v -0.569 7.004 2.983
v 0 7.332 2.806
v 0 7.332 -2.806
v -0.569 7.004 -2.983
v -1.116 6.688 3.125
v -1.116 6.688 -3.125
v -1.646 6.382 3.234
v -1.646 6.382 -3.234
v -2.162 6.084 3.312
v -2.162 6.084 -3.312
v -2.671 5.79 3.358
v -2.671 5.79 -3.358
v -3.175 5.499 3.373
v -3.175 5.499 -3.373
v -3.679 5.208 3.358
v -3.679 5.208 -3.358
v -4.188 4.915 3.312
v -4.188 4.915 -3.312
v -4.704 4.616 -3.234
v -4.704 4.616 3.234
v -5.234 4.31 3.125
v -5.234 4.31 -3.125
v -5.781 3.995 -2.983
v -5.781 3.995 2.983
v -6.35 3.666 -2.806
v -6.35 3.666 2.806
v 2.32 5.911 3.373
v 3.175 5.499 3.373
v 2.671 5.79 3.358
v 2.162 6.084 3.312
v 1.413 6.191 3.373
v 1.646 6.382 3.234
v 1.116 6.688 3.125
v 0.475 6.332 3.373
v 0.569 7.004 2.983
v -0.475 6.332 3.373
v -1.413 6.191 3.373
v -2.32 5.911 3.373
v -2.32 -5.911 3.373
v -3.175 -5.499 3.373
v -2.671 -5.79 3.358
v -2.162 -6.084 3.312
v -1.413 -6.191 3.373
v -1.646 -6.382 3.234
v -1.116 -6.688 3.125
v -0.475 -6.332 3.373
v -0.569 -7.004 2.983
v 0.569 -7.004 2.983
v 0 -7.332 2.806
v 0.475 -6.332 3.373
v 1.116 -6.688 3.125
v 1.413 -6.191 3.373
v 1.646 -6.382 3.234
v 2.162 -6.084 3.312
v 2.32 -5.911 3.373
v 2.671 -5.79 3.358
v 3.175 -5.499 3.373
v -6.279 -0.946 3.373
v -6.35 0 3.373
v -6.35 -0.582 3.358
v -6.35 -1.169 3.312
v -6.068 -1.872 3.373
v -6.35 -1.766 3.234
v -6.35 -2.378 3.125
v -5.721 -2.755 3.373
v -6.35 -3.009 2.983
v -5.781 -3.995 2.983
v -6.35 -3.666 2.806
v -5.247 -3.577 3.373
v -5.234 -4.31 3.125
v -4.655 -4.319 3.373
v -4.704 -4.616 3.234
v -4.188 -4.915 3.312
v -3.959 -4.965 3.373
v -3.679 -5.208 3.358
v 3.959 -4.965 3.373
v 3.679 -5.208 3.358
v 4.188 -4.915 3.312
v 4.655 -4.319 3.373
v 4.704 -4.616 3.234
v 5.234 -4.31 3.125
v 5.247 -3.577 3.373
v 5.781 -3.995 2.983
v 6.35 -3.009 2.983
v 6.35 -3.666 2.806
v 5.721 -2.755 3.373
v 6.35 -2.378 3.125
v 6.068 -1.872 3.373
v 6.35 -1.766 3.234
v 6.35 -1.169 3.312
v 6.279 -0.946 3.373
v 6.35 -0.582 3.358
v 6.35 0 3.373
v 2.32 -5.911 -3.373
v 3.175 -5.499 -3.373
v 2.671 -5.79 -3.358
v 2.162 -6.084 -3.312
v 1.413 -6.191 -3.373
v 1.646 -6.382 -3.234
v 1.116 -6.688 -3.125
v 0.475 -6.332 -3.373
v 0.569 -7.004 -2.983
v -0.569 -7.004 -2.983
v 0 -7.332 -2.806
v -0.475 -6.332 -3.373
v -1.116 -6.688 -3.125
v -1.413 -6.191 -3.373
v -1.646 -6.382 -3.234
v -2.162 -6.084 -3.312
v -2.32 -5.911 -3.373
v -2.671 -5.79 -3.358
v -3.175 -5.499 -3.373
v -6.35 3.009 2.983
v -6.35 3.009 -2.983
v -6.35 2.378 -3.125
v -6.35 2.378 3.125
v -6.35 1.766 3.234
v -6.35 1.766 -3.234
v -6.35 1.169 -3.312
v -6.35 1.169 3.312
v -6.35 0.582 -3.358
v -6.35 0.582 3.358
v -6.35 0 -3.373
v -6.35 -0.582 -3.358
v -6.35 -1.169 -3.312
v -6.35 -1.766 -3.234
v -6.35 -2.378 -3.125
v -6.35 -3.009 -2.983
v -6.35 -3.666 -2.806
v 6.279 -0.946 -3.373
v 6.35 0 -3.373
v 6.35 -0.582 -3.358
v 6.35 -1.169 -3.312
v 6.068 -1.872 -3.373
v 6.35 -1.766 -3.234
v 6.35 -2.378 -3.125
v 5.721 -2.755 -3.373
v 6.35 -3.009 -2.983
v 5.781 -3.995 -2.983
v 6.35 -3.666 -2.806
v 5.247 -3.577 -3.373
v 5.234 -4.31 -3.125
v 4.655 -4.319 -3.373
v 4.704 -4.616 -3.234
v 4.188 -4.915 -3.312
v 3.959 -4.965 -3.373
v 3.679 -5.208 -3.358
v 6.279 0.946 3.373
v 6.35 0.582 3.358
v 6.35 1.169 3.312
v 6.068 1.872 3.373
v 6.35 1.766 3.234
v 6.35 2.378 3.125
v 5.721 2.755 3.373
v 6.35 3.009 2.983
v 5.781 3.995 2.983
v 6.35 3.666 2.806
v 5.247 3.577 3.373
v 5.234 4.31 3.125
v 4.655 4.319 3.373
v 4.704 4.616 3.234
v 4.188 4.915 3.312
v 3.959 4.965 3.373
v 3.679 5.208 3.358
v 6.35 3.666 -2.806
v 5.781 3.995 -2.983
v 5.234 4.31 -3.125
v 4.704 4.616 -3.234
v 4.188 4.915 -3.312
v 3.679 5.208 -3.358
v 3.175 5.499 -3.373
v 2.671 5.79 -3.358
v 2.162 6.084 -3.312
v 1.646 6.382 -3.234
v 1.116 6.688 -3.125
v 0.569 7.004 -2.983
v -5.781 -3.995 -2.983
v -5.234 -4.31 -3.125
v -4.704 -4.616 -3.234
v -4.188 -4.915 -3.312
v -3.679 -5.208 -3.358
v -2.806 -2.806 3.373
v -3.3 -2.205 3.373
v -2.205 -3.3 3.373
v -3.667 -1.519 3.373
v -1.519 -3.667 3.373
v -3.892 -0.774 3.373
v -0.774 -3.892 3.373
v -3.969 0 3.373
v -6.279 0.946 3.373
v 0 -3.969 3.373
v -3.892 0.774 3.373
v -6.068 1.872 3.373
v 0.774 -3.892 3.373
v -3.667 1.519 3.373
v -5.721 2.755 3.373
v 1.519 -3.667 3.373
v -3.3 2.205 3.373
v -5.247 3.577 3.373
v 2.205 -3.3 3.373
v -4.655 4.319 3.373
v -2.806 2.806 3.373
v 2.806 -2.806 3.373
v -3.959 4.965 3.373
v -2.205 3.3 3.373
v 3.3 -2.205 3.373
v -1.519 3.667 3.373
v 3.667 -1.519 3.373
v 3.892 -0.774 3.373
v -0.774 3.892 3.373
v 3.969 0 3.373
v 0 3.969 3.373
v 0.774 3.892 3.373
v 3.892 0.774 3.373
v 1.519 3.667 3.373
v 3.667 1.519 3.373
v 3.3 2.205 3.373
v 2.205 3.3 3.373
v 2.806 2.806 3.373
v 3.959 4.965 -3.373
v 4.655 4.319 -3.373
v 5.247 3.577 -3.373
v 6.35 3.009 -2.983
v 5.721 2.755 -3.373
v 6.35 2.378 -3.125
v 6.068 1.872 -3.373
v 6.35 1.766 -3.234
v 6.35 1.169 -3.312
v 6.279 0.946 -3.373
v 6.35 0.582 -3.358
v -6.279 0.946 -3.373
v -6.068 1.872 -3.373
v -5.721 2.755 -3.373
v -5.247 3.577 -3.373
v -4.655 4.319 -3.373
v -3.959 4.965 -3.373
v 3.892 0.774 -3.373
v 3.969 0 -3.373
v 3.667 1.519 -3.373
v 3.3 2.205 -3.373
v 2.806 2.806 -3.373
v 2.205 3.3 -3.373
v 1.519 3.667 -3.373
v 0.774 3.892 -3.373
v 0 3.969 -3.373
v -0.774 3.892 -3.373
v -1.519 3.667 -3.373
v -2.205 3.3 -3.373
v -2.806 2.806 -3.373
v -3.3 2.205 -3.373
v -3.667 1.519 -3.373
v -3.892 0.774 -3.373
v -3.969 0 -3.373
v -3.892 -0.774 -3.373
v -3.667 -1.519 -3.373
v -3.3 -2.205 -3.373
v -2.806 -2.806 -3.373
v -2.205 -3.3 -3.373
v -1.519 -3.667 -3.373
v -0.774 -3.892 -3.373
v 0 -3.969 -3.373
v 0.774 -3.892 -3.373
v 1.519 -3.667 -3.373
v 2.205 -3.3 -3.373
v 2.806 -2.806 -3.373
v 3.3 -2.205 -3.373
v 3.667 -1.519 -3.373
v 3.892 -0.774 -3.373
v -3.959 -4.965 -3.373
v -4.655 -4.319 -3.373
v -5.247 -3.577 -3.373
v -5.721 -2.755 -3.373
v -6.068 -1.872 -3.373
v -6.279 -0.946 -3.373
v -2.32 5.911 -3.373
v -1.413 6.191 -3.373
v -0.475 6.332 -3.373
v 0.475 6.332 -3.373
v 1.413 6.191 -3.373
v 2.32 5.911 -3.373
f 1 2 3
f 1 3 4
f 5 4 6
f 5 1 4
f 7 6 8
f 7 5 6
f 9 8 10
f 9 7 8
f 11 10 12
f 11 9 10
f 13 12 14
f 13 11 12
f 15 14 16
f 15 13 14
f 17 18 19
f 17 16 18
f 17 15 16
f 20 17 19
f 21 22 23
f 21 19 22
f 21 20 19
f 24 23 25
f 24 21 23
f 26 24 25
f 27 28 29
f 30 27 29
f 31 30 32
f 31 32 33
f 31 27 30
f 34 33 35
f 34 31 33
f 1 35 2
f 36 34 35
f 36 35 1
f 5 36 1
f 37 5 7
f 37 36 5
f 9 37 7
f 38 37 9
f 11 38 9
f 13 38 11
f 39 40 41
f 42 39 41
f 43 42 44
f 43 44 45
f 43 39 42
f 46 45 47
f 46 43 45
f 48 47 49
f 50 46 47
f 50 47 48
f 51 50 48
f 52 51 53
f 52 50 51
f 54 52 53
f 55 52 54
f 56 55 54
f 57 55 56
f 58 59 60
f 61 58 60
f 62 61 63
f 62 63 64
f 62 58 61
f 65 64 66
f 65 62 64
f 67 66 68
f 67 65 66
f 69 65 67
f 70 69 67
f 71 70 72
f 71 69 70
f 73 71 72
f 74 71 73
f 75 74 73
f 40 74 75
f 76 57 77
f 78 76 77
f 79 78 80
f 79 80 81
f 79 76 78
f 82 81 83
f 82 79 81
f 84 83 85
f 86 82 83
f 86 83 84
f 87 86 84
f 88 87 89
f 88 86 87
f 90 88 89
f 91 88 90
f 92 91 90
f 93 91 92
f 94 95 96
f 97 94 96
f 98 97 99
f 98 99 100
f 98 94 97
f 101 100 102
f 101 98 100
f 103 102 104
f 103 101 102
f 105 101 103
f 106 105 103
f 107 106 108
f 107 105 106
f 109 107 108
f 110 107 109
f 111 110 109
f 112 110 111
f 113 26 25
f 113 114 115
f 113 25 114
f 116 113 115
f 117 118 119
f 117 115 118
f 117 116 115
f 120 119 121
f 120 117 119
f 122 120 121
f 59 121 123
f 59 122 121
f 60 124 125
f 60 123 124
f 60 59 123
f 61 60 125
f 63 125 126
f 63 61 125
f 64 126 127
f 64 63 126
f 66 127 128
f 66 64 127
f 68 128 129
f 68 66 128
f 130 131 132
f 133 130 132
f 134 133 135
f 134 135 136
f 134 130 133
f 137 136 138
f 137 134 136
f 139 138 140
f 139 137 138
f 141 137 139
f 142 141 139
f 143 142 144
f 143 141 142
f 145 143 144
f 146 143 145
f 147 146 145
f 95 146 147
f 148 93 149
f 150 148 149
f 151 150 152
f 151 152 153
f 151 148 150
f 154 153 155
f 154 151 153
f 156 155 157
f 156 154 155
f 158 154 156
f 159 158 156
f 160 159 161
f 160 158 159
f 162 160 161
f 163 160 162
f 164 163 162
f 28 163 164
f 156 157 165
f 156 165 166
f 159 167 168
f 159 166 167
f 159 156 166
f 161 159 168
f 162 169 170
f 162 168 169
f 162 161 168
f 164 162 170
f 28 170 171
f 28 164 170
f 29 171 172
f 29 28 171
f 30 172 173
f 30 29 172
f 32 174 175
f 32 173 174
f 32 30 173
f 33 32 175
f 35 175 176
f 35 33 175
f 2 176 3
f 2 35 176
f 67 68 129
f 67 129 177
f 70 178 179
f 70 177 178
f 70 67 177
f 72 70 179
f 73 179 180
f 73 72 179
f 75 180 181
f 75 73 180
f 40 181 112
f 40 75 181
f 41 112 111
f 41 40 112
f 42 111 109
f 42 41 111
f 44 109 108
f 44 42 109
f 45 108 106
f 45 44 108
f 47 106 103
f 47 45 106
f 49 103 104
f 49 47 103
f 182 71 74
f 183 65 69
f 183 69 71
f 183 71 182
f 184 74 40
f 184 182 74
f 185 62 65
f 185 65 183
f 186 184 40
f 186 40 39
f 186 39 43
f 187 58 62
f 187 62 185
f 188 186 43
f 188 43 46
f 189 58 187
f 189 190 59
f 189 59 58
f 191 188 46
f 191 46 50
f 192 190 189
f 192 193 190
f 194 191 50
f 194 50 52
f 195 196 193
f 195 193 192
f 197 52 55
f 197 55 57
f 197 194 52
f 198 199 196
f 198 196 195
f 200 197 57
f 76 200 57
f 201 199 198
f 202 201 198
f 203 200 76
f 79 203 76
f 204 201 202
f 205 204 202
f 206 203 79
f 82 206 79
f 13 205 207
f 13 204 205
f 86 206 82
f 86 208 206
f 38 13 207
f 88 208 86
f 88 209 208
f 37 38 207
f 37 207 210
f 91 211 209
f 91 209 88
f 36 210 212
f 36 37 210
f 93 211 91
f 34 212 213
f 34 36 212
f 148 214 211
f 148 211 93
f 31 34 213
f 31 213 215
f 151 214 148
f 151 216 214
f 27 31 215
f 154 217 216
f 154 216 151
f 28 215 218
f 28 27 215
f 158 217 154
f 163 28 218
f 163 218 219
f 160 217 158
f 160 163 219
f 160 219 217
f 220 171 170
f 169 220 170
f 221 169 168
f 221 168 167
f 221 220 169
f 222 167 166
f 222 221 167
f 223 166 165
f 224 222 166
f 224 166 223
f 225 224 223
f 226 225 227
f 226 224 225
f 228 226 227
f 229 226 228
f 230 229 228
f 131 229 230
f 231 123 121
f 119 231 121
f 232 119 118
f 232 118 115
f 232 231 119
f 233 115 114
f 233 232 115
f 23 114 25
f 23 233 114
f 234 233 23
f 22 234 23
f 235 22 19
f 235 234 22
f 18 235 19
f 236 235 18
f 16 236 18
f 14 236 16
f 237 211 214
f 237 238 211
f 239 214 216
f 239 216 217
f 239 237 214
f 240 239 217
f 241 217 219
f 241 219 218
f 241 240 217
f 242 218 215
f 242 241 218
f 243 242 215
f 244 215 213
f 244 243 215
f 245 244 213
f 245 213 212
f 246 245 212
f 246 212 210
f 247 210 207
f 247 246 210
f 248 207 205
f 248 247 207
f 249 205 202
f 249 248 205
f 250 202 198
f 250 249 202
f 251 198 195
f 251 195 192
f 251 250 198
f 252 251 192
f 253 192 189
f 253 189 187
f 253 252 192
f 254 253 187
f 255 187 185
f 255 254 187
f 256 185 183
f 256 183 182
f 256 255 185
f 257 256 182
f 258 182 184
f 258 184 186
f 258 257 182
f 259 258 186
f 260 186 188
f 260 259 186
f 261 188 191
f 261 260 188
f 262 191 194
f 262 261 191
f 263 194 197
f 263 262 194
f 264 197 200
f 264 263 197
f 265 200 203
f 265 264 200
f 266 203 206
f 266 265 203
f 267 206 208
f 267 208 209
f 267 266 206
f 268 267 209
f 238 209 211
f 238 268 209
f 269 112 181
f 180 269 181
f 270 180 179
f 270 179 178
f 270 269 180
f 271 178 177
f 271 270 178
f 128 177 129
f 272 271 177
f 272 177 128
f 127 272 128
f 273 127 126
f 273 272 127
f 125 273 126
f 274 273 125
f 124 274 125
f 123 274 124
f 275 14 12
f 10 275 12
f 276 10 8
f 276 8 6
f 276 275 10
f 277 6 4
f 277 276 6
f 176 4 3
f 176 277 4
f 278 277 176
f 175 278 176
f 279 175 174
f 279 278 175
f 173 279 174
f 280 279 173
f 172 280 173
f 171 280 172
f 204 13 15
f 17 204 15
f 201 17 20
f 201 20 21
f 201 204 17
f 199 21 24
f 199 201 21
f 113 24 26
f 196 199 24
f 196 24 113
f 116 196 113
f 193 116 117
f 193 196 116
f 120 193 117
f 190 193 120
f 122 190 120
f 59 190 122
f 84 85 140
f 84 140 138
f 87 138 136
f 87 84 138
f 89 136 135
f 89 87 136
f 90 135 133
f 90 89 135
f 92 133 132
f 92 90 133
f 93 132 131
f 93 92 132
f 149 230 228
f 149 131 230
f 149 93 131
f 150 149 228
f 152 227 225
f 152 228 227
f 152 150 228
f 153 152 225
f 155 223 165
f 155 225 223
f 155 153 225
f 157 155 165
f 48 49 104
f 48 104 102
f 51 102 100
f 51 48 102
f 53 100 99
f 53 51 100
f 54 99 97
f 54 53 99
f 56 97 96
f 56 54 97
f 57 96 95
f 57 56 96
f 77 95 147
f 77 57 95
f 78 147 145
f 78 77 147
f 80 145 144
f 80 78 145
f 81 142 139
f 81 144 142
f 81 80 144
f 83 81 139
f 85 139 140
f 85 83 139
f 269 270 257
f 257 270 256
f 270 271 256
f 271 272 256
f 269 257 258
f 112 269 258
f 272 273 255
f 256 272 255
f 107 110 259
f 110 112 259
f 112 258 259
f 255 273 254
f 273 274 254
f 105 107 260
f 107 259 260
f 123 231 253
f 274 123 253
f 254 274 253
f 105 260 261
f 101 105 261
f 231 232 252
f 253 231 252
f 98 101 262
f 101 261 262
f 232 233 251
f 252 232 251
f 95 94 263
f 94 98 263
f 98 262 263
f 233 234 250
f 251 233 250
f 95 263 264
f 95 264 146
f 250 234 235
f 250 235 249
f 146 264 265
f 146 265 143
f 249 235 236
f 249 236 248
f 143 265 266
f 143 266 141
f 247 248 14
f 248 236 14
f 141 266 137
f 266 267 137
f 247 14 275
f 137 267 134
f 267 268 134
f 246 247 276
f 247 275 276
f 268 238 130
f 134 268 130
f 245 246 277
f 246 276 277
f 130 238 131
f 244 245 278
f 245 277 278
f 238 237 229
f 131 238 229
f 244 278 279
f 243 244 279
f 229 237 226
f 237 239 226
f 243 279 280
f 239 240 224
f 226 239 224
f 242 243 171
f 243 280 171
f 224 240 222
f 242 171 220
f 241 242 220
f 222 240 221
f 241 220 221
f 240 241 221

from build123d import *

# Parameters (mm, degrees)
SKETCH1_R               = 3.96875
EXTRUDE1_DEPTH          = 3.3734375
SKETCH7_OUTSIDE_W       = 106.796
SKETCH7_OUTSIDE_H       = 108.76
SKETCH7_OUTSIDE_R       = 6.35
EXTRUDE2_DEPTH          = 25.4
EXTRUDE2_DRAFT          = -60
MIRROR1_COPY_1_SKETCH_W = 106.796
MIRROR1_COPY_1_SKETCH_H = 108.76
MIRROR1_COPY_1_SKETCH_R = 6.35
MIRROR1_COPY_1_DEPTH    = 25.4
MIRROR1_COPY_1_DRAFT    = -60


with BuildPart() as part:
    # Sketch1 → Extrude1 (new, symmetric)
    with BuildSketch(Plane.XY):
        Polygon((-6.35, 3.666174209), (-6.35, -3.666174209), (0, -7.332348419), (6.35, -3.666174209), (6.35, 3.666174209), (0, 7.332348419), align=None)
        Circle(SKETCH1_R, mode=Mode.SUBTRACT)
    extrude(amount=EXTRUDE1_DEPTH, both=True)


with BuildPart() as extrude2_tool:
    # Sketch7 outside → Extrude2 (with draft: the straight prism first)
    with BuildSketch(Plane.XY.offset(3.3734375)):
        Rectangle(SKETCH7_OUTSIDE_W, SKETCH7_OUTSIDE_H)
        Circle(SKETCH7_OUTSIDE_R, mode=Mode.SUBTRACT)
    extrude(amount=-EXTRUDE2_DEPTH)
    # Extrude2: the draft: its side faces are tilted about the plane it starts from
    extrude2_sides = [extrude2_tool.faces().sort_by_distance(p)[0] for p in [
        (0, -54.38, -9.3265625),
        (53.398, 0, -9.3265625),
        (0, 54.38, -9.3265625),
        (-53.398, 0, -9.3265625),
        (-6.35, 0, -9.3265625),
    ]]
    draft(extrude2_sides, Plane.XY.offset(3.3734375), EXTRUDE2_DRAFT)


with BuildPart() as part_1:
    add(part.part)

    # Extrude2: cut by extrude2_tool
    add(extrude2_tool.part, mode=Mode.SUBTRACT)


with BuildPart() as mirror1_copy_1_tool:
    # Mirror1 copy 1 sketch → Mirror1 copy 1 (with draft: the straight prism first)
    with BuildSketch(Plane(origin=(0, 0, -3.3734375), x_dir=(1, 0, 0), z_dir=(0, 0, -1))):
        Rectangle(MIRROR1_COPY_1_SKETCH_W, MIRROR1_COPY_1_SKETCH_H)
        Circle(MIRROR1_COPY_1_SKETCH_R, mode=Mode.SUBTRACT)
    extrude(amount=-MIRROR1_COPY_1_DEPTH)
    # Mirror1 copy 1: the draft: its side faces are tilted about the plane it starts from
    mirror1_copy_1_sides = [mirror1_copy_1_tool.faces().sort_by_distance(p)[0] for p in [
        (0, -54.38, 9.3265625),
        (53.398, 0, 9.3265625),
        (0, 54.38, 9.3265625),
        (-53.398, 0, 9.3265625),
        (-6.35, 0, 9.3265625),
    ]]
    draft(mirror1_copy_1_sides, Plane(origin=(0, 0, -3.3734375), x_dir=(1, 0, 0), z_dir=(0, 0, -1)), MIRROR1_COPY_1_DRAFT)


with BuildPart() as part_2:
    add(part_1.part)

    # Mirror1 copy 1: cut by mirror1_copy_1_tool
    add(mirror1_copy_1_tool.part, mode=Mode.SUBTRACT)


solid = part_2.part
